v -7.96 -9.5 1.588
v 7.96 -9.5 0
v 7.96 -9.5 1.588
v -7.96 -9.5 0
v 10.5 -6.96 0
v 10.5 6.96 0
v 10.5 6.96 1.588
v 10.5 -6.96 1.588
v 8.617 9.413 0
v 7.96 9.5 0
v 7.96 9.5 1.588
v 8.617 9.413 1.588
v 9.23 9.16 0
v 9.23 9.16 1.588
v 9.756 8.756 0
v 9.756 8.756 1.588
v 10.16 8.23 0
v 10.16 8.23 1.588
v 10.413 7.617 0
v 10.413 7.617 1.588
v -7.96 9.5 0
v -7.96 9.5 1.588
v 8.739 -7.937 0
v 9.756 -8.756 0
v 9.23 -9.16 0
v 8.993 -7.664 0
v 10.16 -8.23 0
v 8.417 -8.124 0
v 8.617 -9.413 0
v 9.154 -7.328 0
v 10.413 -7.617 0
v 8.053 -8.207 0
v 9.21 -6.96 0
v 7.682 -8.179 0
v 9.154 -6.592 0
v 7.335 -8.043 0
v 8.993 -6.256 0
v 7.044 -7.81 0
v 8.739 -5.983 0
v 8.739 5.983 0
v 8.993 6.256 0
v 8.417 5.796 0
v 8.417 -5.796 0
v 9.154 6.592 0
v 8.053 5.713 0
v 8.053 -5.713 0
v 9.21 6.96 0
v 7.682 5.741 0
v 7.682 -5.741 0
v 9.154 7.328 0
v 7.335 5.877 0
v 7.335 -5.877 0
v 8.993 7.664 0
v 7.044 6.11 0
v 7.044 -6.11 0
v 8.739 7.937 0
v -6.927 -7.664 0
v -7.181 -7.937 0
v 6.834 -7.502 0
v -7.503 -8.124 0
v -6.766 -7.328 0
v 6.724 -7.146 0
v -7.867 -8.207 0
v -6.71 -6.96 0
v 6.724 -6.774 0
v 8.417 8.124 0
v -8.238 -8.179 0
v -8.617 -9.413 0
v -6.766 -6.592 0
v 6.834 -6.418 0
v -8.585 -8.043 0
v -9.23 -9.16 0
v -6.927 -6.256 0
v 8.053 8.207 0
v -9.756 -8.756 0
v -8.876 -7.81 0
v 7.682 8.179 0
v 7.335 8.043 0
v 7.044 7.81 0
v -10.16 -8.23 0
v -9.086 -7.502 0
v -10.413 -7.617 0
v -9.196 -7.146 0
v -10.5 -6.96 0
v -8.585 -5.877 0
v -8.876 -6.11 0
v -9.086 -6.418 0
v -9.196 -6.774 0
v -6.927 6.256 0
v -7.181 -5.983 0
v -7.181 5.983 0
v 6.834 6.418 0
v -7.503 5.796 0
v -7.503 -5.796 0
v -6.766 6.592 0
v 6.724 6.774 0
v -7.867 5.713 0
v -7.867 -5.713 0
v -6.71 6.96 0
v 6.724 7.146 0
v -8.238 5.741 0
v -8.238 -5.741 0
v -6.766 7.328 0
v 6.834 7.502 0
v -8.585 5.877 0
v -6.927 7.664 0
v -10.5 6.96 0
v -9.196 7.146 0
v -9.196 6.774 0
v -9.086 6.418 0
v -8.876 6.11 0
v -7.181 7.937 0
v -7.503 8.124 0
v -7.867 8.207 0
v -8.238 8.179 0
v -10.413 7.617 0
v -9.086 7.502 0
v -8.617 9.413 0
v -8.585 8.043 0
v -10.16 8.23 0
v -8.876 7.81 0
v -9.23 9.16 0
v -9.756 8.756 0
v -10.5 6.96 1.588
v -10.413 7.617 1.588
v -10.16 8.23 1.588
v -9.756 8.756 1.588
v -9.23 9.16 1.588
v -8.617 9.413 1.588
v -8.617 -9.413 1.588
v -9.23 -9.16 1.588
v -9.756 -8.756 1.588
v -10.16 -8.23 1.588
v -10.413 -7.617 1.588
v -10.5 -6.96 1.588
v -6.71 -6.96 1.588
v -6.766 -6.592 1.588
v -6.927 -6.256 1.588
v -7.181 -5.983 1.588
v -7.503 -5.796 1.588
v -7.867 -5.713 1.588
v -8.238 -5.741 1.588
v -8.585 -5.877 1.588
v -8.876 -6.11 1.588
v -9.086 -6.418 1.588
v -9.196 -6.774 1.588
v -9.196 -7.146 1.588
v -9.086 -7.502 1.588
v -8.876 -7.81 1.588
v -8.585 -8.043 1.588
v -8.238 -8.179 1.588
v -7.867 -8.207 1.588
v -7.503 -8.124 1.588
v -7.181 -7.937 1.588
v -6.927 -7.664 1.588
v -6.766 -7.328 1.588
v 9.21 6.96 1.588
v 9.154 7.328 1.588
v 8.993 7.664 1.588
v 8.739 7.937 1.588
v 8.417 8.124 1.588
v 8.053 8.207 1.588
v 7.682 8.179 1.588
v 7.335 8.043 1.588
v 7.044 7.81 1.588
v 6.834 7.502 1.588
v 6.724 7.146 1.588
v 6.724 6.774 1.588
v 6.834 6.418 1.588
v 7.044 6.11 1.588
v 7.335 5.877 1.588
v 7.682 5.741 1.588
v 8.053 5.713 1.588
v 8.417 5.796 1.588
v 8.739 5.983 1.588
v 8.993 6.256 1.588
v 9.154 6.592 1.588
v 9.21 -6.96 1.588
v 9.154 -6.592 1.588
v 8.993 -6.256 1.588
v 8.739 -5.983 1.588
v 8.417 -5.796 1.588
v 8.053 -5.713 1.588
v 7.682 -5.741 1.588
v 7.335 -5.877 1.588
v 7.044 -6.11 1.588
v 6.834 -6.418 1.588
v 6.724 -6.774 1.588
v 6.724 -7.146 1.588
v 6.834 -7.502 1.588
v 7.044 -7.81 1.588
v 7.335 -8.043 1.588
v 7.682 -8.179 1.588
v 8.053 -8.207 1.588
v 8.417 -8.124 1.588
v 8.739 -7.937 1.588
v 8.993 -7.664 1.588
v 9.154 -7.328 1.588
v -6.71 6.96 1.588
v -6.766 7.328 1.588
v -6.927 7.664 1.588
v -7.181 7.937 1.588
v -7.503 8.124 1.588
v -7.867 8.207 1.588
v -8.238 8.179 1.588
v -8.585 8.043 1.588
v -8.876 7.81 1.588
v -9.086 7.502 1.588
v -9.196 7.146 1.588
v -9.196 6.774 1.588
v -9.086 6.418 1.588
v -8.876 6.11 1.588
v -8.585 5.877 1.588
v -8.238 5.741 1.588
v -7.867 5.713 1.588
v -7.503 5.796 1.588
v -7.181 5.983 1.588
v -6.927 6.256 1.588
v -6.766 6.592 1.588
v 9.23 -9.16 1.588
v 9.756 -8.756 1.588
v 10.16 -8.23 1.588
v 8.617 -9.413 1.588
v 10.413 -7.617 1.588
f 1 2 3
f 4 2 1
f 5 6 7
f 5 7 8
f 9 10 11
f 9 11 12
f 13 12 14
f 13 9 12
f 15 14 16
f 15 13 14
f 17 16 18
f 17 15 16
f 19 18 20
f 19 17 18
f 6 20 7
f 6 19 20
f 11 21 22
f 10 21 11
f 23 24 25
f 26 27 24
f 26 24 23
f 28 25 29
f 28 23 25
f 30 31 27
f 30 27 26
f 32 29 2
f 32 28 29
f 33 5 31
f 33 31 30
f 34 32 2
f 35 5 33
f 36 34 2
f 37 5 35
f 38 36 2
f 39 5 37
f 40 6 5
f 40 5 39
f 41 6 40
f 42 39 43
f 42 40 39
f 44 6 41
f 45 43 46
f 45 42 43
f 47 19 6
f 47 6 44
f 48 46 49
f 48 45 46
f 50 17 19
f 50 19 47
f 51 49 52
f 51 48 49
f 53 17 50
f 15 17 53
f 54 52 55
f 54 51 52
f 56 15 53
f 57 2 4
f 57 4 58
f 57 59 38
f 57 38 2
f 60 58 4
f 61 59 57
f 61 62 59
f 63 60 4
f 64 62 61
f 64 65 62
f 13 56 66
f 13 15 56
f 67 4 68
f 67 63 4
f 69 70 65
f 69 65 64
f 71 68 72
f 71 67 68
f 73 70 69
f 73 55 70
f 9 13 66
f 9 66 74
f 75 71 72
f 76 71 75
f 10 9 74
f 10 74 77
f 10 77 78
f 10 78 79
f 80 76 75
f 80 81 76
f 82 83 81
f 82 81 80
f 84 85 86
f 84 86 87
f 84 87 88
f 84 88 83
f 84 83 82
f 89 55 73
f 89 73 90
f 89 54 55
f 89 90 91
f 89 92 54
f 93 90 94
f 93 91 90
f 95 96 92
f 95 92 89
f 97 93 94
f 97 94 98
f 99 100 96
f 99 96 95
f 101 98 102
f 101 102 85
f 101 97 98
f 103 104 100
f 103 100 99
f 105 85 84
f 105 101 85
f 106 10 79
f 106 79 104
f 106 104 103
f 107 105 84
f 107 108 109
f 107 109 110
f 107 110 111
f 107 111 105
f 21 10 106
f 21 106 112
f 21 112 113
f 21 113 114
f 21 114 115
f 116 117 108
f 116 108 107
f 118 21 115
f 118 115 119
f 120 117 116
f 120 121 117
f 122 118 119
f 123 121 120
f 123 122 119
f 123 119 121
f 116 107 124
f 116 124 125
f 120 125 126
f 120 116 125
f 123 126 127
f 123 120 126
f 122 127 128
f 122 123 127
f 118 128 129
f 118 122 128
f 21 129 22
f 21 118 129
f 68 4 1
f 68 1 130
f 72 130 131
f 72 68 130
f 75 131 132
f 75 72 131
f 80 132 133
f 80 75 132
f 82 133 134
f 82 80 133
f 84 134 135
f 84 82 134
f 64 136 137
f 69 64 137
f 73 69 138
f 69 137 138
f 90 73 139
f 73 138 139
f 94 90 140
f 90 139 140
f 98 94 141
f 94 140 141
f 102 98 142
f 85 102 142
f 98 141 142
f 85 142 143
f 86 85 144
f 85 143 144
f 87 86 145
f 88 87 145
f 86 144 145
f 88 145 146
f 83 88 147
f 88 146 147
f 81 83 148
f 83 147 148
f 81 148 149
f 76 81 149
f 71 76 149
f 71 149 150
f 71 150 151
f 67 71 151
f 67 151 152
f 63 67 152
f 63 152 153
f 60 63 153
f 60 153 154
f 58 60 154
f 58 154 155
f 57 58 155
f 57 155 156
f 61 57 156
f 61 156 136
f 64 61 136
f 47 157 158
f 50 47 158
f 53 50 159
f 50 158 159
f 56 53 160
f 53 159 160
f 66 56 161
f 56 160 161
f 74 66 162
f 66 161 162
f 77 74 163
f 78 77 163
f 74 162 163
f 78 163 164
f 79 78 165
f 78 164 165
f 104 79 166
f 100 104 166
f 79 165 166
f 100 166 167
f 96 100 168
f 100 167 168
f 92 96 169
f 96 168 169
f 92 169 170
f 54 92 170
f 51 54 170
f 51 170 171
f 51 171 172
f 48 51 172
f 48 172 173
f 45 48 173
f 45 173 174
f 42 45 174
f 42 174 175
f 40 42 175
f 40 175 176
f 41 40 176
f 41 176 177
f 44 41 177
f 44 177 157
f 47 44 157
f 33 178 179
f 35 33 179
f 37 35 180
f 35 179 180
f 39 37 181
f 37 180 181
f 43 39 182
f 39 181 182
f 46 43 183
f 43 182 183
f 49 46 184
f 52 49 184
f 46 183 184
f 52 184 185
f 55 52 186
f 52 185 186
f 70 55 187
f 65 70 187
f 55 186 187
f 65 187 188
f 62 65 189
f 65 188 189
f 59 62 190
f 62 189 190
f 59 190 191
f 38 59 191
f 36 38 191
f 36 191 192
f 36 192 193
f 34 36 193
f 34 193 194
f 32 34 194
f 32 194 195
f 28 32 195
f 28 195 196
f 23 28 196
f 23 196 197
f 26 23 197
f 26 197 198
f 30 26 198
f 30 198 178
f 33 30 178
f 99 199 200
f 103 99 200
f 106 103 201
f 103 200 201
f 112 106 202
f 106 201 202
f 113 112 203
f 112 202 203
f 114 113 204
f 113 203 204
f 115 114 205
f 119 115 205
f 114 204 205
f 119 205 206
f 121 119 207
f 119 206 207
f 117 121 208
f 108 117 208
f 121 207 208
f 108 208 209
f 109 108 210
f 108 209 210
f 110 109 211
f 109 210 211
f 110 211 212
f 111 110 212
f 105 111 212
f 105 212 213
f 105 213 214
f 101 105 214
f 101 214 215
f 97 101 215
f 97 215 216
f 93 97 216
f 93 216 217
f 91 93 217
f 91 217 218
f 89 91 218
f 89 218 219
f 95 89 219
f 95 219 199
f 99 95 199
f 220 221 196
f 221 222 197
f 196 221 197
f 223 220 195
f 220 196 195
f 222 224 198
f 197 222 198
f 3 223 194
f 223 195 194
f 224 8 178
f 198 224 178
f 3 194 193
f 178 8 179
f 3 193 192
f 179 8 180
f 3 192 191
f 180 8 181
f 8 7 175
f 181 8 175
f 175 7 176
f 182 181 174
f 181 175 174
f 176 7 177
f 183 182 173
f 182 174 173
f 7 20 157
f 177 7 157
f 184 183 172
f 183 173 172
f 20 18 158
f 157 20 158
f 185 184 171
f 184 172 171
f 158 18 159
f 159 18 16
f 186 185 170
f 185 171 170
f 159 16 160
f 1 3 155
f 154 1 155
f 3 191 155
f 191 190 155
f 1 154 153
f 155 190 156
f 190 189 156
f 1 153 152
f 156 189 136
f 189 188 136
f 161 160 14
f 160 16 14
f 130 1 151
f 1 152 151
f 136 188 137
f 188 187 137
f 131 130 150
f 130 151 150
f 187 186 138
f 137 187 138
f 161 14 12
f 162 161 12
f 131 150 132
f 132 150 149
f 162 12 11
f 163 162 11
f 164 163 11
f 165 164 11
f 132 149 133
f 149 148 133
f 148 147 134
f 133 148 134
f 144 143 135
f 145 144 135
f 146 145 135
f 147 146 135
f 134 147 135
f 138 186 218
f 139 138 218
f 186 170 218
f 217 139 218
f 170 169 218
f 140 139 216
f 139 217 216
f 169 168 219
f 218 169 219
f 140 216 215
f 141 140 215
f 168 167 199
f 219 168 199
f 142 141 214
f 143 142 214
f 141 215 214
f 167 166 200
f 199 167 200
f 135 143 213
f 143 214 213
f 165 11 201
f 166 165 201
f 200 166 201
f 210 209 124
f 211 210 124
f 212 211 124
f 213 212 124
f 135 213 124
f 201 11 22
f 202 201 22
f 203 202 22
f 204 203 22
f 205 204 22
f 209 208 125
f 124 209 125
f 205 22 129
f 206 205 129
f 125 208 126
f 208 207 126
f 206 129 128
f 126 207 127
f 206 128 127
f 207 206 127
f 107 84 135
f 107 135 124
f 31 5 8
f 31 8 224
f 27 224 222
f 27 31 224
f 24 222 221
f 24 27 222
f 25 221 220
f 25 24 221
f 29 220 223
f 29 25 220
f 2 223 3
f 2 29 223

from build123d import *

# Parameters (mm, degrees)
BOSS_EXTRUDE1_DEPTH = 1.5875
SKETCH2_R           = 1.25
CUT_EXTRUDE1_DEPTH  = 2.5875


with BuildPart() as part:
    # Sketch1 → Boss-Extrude1 (new body)
    with BuildSketch(Plane.XY):
        with BuildLine():
            Line((7.96, -9.5), (-7.96, -9.5))
            ThreePointArc((-7.96, -9.5), (-9.756051224, -8.756051224), (-10.5, -6.96))
            Line((-10.5, -6.96), (-10.5, 6.96))
            ThreePointArc((-10.5, 6.96), (-9.756051224, 8.756051224), (-7.96, 9.5))
            Line((-7.96, 9.5), (7.96, 9.5))
            ThreePointArc((7.96, 9.5), (9.756051224, 8.756051224), (10.5, 6.96))
            Line((10.5, 6.96), (10.5, -6.96))
            ThreePointArc((10.5, -6.96), (9.756051224, -8.756051224), (7.96, -9.5))
        make_face()
    extrude(amount=BOSS_EXTRUDE1_DEPTH)

    # Sketch2 → Cut-Extrude1 (cut, through all)
    with BuildSketch(Plane.XY.offset(1.5875)):
        with Locations((-7.96, 6.96)):
            Circle(SKETCH2_R)
        with Locations((7.96, 6.96)):
            Circle(SKETCH2_R)
        with Locations((7.96, -6.96)):
            Circle(SKETCH2_R)
        with Locations((-7.96, -6.96)):
            Circle(SKETCH2_R)
    extrude(amount=-CUT_EXTRUDE1_DEPTH, mode=Mode.SUBTRACT)


solid = part.part
